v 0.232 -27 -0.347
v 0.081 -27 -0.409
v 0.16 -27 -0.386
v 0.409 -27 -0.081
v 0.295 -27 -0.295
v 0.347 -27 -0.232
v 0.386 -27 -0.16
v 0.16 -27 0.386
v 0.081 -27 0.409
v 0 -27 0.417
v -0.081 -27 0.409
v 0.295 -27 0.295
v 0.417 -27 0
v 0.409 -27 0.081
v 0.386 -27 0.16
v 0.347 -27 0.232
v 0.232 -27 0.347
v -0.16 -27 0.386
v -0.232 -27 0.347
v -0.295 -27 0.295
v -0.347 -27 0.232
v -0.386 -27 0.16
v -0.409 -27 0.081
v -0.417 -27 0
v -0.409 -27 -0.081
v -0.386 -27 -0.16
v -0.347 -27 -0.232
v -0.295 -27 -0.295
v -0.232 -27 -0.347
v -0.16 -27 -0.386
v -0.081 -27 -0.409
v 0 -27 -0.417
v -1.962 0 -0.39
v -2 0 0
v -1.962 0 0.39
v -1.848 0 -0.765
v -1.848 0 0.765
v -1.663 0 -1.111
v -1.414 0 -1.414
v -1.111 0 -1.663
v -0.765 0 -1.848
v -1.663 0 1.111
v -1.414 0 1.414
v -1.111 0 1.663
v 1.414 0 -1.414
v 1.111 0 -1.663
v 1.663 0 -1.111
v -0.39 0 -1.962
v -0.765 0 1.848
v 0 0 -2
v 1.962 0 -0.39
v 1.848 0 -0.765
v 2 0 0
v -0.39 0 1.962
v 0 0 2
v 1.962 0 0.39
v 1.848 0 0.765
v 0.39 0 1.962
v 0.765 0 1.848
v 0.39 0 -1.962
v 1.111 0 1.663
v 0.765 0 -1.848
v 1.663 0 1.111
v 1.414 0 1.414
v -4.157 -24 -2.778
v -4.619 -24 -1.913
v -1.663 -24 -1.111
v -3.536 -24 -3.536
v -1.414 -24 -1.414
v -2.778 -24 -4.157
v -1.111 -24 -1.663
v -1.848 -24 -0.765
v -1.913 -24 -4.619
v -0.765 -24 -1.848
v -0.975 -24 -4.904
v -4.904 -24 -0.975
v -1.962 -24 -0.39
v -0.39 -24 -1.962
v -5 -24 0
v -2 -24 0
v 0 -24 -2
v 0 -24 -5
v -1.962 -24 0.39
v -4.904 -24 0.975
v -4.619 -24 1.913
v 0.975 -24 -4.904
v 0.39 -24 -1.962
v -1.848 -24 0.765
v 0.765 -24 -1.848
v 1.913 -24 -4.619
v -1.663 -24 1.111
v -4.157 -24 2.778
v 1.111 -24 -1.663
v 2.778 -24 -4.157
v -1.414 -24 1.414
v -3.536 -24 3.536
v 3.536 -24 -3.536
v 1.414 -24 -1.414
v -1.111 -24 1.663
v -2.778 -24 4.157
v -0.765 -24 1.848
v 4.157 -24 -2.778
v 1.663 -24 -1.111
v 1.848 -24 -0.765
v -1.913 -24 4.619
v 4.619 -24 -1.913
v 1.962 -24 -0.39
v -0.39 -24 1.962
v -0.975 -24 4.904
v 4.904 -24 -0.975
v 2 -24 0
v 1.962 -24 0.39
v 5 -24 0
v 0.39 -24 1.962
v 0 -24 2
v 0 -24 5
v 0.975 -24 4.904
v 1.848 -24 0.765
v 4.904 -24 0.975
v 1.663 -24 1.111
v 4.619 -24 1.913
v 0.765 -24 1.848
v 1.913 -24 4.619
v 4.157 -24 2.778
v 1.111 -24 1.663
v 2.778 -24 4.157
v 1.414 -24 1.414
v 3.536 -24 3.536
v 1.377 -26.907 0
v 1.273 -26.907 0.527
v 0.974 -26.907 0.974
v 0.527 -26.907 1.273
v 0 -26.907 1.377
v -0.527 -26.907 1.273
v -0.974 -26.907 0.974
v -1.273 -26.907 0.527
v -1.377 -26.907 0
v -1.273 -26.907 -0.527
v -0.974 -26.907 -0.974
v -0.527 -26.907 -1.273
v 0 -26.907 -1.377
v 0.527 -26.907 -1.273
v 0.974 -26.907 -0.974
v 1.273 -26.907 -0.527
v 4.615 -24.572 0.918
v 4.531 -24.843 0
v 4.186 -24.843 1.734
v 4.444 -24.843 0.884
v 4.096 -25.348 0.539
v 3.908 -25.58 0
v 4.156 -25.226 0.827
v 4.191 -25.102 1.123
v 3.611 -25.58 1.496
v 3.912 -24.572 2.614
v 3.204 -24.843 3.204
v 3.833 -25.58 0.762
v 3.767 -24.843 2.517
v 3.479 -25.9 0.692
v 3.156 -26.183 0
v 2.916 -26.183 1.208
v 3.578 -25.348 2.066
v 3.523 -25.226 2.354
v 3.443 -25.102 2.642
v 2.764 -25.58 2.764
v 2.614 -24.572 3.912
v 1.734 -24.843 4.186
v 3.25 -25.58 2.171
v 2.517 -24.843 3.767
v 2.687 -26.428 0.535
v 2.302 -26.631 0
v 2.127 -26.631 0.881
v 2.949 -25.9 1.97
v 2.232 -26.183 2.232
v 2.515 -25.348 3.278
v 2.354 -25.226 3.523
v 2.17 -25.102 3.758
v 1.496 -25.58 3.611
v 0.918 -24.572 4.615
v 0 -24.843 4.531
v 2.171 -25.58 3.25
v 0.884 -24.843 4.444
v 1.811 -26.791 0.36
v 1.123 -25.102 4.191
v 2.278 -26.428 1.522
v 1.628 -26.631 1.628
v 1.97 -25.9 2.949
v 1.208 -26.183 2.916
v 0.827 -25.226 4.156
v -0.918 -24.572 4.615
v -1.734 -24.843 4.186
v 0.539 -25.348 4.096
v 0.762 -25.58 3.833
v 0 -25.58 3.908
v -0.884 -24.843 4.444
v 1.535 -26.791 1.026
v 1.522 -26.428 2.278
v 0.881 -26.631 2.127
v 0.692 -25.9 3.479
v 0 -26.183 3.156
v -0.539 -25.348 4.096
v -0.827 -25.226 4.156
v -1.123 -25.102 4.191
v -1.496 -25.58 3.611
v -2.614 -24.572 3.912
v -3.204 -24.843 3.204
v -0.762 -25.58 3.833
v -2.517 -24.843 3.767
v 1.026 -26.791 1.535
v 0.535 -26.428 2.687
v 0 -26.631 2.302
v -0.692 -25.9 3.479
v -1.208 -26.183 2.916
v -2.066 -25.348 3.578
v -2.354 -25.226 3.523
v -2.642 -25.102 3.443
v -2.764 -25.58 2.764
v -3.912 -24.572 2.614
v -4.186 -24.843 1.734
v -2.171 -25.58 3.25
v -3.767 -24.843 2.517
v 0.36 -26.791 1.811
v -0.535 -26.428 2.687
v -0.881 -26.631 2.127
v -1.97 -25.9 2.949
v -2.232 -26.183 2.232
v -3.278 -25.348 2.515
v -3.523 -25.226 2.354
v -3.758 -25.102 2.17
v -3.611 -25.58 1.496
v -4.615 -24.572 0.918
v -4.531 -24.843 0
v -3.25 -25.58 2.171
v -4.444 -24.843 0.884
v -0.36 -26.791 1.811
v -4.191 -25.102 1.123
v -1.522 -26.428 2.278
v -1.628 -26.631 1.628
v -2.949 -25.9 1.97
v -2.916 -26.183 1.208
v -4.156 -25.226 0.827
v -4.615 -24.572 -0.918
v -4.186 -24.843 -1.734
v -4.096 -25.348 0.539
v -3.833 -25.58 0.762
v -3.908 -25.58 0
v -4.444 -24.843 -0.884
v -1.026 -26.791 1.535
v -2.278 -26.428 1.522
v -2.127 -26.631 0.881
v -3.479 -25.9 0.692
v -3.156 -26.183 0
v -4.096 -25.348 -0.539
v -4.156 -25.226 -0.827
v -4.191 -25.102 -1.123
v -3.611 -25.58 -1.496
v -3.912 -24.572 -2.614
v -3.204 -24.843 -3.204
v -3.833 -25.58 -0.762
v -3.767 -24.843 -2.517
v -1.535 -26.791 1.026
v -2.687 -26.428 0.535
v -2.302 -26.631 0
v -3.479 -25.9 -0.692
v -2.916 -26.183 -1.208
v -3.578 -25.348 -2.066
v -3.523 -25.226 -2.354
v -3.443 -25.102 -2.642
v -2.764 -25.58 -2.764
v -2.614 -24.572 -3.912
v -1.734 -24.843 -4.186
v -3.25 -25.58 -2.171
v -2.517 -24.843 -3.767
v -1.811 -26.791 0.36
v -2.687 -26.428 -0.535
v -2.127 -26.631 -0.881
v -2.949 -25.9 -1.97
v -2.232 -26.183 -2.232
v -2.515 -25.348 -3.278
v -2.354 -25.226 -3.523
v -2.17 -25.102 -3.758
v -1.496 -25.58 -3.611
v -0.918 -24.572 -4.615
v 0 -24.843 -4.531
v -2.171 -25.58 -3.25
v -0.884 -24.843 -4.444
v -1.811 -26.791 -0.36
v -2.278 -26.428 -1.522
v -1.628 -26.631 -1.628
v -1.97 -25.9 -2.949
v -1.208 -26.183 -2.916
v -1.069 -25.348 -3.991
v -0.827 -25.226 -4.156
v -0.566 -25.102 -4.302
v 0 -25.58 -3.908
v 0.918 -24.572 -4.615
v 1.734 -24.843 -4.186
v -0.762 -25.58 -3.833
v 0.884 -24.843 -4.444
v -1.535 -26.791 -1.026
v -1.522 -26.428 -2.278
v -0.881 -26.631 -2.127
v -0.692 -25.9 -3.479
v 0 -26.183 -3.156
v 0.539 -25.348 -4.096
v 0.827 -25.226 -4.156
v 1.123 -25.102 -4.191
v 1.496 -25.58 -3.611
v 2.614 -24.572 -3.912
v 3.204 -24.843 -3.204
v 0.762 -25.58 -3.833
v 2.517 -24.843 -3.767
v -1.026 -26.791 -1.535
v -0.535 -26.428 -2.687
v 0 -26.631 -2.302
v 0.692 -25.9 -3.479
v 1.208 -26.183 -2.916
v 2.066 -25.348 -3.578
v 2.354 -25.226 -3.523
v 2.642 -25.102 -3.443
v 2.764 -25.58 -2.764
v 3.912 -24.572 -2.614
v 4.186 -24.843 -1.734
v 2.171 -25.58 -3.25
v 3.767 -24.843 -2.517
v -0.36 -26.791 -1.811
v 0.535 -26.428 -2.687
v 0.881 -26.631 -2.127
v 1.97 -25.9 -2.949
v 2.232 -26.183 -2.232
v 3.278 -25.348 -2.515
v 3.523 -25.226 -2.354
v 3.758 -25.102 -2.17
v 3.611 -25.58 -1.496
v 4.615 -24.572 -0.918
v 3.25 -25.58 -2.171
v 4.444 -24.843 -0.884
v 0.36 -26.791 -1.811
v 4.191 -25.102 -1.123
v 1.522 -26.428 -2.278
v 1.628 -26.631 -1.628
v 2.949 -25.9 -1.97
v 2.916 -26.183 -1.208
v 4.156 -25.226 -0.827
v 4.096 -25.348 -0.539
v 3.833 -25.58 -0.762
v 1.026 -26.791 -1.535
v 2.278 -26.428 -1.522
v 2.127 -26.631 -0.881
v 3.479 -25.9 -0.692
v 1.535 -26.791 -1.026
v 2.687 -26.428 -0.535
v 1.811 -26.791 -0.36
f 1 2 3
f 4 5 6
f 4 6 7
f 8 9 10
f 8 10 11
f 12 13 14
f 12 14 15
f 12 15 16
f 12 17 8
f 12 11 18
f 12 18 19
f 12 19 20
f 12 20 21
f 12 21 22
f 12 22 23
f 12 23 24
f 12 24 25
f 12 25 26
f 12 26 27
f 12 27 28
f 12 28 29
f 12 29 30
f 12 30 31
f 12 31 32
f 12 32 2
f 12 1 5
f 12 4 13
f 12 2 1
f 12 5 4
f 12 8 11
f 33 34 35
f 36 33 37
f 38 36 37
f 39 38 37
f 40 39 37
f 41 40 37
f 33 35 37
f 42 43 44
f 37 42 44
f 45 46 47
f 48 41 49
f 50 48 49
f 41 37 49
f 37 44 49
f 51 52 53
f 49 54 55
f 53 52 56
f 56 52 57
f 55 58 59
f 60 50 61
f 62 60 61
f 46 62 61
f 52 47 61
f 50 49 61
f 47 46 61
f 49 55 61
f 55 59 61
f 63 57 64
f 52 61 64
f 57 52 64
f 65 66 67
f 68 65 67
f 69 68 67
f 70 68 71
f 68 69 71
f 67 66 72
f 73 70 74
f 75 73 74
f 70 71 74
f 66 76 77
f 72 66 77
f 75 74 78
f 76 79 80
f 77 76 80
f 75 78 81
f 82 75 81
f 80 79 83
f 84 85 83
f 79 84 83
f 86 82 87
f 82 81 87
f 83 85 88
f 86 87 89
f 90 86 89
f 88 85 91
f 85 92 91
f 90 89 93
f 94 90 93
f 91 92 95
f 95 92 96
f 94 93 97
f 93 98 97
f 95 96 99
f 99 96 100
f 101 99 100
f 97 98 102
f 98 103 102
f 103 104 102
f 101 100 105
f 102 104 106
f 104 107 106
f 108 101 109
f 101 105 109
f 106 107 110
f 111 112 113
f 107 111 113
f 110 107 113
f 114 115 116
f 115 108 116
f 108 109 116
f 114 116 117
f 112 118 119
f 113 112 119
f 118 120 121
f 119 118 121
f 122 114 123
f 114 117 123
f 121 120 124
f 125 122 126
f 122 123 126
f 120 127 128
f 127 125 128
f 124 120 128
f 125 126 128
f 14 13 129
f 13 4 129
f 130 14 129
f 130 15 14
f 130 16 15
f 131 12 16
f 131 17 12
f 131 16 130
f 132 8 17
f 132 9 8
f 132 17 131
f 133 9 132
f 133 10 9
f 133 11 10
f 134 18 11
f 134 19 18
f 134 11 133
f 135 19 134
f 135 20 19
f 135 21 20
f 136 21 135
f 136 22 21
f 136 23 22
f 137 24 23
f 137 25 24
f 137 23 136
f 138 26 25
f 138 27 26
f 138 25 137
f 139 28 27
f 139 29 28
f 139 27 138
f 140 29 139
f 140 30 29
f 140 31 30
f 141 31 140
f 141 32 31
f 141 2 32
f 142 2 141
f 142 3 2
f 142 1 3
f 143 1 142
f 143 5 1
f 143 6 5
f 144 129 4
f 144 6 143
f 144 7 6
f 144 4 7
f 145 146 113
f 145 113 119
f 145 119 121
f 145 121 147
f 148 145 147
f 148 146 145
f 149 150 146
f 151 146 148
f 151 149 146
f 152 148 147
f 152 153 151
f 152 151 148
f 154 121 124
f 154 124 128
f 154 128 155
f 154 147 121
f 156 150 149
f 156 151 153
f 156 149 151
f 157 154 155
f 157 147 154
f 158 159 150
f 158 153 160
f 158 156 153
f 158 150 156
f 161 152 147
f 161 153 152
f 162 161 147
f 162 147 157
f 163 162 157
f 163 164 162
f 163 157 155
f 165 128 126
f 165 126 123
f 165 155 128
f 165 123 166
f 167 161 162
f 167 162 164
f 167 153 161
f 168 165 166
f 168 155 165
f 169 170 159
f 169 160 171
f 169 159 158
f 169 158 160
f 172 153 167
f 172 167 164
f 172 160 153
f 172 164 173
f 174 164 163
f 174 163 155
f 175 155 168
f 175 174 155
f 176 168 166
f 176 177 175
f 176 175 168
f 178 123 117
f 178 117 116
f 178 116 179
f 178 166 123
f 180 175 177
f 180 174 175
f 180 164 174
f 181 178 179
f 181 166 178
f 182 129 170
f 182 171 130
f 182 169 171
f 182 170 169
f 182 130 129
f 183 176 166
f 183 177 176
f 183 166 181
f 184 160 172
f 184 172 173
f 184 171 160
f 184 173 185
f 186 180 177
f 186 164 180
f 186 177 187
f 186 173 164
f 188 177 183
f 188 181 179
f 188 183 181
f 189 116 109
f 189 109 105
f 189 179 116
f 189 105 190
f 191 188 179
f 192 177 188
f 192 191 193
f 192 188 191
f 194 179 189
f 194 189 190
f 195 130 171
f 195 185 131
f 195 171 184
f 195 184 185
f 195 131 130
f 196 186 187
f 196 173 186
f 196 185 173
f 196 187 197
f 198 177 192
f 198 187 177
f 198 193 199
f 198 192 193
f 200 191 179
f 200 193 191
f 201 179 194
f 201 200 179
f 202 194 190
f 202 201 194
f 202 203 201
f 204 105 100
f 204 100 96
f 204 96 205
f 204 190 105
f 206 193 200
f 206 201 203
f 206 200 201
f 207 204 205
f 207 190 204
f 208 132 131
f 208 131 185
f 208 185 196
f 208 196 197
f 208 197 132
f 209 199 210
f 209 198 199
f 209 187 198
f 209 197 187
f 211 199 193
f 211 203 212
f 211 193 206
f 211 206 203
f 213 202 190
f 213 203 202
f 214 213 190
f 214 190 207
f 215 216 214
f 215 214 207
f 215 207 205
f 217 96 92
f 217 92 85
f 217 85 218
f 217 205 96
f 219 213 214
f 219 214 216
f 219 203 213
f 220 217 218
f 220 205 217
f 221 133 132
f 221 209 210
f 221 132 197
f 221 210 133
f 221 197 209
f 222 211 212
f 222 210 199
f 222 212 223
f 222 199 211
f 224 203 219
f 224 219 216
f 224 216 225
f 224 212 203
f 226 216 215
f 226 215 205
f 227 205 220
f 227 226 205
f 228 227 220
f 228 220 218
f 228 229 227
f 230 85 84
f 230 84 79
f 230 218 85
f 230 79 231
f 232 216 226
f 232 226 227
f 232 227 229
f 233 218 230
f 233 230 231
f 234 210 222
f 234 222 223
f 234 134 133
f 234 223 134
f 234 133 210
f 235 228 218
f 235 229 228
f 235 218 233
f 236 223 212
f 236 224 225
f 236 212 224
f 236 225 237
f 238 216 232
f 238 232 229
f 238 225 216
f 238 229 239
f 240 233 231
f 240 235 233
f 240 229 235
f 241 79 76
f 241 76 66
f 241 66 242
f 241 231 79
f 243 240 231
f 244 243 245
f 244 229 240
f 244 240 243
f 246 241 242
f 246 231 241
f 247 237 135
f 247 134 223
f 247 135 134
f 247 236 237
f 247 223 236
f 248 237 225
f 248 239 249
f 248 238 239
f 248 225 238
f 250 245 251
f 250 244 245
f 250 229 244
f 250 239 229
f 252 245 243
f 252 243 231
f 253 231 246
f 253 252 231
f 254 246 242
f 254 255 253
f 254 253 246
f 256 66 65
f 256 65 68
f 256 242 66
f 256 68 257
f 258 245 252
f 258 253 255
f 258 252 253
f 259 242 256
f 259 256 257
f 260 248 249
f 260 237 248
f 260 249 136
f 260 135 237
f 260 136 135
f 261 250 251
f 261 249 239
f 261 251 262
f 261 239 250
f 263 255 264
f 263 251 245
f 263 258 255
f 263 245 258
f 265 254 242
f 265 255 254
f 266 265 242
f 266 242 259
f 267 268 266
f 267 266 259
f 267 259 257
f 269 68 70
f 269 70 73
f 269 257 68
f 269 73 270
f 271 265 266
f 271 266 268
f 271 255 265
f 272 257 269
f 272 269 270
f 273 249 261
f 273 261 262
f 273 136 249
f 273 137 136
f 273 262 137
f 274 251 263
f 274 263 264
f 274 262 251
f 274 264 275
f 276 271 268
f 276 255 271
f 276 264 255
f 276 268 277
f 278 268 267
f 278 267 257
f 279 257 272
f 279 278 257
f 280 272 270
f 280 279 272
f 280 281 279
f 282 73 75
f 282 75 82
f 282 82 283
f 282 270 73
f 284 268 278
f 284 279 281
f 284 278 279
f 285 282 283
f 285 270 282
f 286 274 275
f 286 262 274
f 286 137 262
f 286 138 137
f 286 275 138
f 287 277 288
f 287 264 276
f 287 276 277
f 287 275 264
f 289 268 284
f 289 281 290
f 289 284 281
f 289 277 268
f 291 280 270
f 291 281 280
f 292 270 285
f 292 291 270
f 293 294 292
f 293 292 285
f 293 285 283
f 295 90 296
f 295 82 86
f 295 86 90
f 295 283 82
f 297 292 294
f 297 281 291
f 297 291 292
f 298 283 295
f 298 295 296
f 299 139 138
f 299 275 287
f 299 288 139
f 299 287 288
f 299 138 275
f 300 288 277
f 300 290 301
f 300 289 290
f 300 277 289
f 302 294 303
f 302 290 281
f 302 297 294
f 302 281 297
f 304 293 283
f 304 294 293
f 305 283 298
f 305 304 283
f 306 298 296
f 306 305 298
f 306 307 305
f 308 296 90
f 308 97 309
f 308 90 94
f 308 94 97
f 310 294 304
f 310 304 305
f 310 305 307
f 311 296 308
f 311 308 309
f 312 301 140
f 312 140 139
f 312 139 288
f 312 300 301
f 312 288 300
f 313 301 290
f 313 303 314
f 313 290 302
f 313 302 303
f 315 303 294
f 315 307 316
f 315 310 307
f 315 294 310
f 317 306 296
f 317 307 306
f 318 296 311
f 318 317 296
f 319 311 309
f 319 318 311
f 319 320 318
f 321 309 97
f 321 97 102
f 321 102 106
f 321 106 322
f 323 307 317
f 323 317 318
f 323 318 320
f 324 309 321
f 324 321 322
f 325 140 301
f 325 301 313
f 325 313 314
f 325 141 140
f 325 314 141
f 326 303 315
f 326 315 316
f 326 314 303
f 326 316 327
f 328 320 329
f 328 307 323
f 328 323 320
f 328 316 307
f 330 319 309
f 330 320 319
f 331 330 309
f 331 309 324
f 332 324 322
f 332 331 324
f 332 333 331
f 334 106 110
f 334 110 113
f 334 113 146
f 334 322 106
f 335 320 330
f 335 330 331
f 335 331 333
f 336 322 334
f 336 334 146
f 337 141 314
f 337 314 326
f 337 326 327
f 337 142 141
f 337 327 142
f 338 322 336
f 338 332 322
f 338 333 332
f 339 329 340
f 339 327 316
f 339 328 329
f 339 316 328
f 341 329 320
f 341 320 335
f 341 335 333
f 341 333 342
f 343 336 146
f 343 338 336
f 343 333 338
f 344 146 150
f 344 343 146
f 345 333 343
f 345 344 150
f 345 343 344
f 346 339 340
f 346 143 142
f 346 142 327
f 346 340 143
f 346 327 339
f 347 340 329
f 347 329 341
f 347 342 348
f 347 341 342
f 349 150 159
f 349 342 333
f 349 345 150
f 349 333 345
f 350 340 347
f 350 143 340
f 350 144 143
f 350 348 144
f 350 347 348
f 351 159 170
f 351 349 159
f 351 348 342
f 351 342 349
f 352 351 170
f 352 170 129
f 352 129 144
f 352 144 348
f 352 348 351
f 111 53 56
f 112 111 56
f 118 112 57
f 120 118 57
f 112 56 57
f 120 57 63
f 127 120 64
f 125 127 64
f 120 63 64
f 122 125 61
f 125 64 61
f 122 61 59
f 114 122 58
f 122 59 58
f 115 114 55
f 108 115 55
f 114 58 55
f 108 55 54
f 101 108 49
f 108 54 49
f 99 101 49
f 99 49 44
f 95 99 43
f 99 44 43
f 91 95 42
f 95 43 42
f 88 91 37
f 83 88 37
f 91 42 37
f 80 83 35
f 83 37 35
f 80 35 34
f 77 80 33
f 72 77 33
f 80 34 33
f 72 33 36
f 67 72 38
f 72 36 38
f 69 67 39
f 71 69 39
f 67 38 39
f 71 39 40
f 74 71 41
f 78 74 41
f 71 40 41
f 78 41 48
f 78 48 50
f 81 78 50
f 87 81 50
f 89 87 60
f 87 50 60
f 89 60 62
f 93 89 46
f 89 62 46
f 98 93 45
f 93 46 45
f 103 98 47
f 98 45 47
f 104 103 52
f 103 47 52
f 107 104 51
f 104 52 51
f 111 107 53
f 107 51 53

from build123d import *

# Parameters (mm, degrees)
F0_R     = 2
F1_DEPTH = 24
F2_R     = 5
F2_R_2   = 2
F3_DEPTH = 3


# Not quite as in the source:
# - a fillet or chamfer that OpenCascade refuses, or shapes differently, is made with other operations: its cross-section is extruded or revolved along the edge and cut away or added


with BuildPart() as f1:
    # F0 (on Front) → F1 (new body)
    with BuildSketch(Plane.XZ):
        Circle(F0_R)
    extrude(amount=F1_DEPTH)

    # F2 (on face) → F3 (join)
    with BuildSketch(Plane.XZ.offset(24)):
        Circle(F2_R)
        Circle(F2_R_2, mode=Mode.SUBTRACT)
        Circle(F2_R_2)
    extrude(amount=F3_DEPTH)

    # F4: fillet of radius 5 on 1 edges, made by hand

    # F4_s1 → F4_t2 (revolve, cut)
    with BuildSketch(Plane.XY):
        with BuildLine():
            ThreePointArc((5, -24), (3.1560370926, -26.1833001327), (0.417424305, -27))
            Line((0.417424305, -27), (5, -27))
            Line((5, -27), (5, -24))
        make_face()
    revolve(axis=Axis((0, -27, 0), (0, -1, 0)), mode=Mode.SUBTRACT)


solid = f1.part
